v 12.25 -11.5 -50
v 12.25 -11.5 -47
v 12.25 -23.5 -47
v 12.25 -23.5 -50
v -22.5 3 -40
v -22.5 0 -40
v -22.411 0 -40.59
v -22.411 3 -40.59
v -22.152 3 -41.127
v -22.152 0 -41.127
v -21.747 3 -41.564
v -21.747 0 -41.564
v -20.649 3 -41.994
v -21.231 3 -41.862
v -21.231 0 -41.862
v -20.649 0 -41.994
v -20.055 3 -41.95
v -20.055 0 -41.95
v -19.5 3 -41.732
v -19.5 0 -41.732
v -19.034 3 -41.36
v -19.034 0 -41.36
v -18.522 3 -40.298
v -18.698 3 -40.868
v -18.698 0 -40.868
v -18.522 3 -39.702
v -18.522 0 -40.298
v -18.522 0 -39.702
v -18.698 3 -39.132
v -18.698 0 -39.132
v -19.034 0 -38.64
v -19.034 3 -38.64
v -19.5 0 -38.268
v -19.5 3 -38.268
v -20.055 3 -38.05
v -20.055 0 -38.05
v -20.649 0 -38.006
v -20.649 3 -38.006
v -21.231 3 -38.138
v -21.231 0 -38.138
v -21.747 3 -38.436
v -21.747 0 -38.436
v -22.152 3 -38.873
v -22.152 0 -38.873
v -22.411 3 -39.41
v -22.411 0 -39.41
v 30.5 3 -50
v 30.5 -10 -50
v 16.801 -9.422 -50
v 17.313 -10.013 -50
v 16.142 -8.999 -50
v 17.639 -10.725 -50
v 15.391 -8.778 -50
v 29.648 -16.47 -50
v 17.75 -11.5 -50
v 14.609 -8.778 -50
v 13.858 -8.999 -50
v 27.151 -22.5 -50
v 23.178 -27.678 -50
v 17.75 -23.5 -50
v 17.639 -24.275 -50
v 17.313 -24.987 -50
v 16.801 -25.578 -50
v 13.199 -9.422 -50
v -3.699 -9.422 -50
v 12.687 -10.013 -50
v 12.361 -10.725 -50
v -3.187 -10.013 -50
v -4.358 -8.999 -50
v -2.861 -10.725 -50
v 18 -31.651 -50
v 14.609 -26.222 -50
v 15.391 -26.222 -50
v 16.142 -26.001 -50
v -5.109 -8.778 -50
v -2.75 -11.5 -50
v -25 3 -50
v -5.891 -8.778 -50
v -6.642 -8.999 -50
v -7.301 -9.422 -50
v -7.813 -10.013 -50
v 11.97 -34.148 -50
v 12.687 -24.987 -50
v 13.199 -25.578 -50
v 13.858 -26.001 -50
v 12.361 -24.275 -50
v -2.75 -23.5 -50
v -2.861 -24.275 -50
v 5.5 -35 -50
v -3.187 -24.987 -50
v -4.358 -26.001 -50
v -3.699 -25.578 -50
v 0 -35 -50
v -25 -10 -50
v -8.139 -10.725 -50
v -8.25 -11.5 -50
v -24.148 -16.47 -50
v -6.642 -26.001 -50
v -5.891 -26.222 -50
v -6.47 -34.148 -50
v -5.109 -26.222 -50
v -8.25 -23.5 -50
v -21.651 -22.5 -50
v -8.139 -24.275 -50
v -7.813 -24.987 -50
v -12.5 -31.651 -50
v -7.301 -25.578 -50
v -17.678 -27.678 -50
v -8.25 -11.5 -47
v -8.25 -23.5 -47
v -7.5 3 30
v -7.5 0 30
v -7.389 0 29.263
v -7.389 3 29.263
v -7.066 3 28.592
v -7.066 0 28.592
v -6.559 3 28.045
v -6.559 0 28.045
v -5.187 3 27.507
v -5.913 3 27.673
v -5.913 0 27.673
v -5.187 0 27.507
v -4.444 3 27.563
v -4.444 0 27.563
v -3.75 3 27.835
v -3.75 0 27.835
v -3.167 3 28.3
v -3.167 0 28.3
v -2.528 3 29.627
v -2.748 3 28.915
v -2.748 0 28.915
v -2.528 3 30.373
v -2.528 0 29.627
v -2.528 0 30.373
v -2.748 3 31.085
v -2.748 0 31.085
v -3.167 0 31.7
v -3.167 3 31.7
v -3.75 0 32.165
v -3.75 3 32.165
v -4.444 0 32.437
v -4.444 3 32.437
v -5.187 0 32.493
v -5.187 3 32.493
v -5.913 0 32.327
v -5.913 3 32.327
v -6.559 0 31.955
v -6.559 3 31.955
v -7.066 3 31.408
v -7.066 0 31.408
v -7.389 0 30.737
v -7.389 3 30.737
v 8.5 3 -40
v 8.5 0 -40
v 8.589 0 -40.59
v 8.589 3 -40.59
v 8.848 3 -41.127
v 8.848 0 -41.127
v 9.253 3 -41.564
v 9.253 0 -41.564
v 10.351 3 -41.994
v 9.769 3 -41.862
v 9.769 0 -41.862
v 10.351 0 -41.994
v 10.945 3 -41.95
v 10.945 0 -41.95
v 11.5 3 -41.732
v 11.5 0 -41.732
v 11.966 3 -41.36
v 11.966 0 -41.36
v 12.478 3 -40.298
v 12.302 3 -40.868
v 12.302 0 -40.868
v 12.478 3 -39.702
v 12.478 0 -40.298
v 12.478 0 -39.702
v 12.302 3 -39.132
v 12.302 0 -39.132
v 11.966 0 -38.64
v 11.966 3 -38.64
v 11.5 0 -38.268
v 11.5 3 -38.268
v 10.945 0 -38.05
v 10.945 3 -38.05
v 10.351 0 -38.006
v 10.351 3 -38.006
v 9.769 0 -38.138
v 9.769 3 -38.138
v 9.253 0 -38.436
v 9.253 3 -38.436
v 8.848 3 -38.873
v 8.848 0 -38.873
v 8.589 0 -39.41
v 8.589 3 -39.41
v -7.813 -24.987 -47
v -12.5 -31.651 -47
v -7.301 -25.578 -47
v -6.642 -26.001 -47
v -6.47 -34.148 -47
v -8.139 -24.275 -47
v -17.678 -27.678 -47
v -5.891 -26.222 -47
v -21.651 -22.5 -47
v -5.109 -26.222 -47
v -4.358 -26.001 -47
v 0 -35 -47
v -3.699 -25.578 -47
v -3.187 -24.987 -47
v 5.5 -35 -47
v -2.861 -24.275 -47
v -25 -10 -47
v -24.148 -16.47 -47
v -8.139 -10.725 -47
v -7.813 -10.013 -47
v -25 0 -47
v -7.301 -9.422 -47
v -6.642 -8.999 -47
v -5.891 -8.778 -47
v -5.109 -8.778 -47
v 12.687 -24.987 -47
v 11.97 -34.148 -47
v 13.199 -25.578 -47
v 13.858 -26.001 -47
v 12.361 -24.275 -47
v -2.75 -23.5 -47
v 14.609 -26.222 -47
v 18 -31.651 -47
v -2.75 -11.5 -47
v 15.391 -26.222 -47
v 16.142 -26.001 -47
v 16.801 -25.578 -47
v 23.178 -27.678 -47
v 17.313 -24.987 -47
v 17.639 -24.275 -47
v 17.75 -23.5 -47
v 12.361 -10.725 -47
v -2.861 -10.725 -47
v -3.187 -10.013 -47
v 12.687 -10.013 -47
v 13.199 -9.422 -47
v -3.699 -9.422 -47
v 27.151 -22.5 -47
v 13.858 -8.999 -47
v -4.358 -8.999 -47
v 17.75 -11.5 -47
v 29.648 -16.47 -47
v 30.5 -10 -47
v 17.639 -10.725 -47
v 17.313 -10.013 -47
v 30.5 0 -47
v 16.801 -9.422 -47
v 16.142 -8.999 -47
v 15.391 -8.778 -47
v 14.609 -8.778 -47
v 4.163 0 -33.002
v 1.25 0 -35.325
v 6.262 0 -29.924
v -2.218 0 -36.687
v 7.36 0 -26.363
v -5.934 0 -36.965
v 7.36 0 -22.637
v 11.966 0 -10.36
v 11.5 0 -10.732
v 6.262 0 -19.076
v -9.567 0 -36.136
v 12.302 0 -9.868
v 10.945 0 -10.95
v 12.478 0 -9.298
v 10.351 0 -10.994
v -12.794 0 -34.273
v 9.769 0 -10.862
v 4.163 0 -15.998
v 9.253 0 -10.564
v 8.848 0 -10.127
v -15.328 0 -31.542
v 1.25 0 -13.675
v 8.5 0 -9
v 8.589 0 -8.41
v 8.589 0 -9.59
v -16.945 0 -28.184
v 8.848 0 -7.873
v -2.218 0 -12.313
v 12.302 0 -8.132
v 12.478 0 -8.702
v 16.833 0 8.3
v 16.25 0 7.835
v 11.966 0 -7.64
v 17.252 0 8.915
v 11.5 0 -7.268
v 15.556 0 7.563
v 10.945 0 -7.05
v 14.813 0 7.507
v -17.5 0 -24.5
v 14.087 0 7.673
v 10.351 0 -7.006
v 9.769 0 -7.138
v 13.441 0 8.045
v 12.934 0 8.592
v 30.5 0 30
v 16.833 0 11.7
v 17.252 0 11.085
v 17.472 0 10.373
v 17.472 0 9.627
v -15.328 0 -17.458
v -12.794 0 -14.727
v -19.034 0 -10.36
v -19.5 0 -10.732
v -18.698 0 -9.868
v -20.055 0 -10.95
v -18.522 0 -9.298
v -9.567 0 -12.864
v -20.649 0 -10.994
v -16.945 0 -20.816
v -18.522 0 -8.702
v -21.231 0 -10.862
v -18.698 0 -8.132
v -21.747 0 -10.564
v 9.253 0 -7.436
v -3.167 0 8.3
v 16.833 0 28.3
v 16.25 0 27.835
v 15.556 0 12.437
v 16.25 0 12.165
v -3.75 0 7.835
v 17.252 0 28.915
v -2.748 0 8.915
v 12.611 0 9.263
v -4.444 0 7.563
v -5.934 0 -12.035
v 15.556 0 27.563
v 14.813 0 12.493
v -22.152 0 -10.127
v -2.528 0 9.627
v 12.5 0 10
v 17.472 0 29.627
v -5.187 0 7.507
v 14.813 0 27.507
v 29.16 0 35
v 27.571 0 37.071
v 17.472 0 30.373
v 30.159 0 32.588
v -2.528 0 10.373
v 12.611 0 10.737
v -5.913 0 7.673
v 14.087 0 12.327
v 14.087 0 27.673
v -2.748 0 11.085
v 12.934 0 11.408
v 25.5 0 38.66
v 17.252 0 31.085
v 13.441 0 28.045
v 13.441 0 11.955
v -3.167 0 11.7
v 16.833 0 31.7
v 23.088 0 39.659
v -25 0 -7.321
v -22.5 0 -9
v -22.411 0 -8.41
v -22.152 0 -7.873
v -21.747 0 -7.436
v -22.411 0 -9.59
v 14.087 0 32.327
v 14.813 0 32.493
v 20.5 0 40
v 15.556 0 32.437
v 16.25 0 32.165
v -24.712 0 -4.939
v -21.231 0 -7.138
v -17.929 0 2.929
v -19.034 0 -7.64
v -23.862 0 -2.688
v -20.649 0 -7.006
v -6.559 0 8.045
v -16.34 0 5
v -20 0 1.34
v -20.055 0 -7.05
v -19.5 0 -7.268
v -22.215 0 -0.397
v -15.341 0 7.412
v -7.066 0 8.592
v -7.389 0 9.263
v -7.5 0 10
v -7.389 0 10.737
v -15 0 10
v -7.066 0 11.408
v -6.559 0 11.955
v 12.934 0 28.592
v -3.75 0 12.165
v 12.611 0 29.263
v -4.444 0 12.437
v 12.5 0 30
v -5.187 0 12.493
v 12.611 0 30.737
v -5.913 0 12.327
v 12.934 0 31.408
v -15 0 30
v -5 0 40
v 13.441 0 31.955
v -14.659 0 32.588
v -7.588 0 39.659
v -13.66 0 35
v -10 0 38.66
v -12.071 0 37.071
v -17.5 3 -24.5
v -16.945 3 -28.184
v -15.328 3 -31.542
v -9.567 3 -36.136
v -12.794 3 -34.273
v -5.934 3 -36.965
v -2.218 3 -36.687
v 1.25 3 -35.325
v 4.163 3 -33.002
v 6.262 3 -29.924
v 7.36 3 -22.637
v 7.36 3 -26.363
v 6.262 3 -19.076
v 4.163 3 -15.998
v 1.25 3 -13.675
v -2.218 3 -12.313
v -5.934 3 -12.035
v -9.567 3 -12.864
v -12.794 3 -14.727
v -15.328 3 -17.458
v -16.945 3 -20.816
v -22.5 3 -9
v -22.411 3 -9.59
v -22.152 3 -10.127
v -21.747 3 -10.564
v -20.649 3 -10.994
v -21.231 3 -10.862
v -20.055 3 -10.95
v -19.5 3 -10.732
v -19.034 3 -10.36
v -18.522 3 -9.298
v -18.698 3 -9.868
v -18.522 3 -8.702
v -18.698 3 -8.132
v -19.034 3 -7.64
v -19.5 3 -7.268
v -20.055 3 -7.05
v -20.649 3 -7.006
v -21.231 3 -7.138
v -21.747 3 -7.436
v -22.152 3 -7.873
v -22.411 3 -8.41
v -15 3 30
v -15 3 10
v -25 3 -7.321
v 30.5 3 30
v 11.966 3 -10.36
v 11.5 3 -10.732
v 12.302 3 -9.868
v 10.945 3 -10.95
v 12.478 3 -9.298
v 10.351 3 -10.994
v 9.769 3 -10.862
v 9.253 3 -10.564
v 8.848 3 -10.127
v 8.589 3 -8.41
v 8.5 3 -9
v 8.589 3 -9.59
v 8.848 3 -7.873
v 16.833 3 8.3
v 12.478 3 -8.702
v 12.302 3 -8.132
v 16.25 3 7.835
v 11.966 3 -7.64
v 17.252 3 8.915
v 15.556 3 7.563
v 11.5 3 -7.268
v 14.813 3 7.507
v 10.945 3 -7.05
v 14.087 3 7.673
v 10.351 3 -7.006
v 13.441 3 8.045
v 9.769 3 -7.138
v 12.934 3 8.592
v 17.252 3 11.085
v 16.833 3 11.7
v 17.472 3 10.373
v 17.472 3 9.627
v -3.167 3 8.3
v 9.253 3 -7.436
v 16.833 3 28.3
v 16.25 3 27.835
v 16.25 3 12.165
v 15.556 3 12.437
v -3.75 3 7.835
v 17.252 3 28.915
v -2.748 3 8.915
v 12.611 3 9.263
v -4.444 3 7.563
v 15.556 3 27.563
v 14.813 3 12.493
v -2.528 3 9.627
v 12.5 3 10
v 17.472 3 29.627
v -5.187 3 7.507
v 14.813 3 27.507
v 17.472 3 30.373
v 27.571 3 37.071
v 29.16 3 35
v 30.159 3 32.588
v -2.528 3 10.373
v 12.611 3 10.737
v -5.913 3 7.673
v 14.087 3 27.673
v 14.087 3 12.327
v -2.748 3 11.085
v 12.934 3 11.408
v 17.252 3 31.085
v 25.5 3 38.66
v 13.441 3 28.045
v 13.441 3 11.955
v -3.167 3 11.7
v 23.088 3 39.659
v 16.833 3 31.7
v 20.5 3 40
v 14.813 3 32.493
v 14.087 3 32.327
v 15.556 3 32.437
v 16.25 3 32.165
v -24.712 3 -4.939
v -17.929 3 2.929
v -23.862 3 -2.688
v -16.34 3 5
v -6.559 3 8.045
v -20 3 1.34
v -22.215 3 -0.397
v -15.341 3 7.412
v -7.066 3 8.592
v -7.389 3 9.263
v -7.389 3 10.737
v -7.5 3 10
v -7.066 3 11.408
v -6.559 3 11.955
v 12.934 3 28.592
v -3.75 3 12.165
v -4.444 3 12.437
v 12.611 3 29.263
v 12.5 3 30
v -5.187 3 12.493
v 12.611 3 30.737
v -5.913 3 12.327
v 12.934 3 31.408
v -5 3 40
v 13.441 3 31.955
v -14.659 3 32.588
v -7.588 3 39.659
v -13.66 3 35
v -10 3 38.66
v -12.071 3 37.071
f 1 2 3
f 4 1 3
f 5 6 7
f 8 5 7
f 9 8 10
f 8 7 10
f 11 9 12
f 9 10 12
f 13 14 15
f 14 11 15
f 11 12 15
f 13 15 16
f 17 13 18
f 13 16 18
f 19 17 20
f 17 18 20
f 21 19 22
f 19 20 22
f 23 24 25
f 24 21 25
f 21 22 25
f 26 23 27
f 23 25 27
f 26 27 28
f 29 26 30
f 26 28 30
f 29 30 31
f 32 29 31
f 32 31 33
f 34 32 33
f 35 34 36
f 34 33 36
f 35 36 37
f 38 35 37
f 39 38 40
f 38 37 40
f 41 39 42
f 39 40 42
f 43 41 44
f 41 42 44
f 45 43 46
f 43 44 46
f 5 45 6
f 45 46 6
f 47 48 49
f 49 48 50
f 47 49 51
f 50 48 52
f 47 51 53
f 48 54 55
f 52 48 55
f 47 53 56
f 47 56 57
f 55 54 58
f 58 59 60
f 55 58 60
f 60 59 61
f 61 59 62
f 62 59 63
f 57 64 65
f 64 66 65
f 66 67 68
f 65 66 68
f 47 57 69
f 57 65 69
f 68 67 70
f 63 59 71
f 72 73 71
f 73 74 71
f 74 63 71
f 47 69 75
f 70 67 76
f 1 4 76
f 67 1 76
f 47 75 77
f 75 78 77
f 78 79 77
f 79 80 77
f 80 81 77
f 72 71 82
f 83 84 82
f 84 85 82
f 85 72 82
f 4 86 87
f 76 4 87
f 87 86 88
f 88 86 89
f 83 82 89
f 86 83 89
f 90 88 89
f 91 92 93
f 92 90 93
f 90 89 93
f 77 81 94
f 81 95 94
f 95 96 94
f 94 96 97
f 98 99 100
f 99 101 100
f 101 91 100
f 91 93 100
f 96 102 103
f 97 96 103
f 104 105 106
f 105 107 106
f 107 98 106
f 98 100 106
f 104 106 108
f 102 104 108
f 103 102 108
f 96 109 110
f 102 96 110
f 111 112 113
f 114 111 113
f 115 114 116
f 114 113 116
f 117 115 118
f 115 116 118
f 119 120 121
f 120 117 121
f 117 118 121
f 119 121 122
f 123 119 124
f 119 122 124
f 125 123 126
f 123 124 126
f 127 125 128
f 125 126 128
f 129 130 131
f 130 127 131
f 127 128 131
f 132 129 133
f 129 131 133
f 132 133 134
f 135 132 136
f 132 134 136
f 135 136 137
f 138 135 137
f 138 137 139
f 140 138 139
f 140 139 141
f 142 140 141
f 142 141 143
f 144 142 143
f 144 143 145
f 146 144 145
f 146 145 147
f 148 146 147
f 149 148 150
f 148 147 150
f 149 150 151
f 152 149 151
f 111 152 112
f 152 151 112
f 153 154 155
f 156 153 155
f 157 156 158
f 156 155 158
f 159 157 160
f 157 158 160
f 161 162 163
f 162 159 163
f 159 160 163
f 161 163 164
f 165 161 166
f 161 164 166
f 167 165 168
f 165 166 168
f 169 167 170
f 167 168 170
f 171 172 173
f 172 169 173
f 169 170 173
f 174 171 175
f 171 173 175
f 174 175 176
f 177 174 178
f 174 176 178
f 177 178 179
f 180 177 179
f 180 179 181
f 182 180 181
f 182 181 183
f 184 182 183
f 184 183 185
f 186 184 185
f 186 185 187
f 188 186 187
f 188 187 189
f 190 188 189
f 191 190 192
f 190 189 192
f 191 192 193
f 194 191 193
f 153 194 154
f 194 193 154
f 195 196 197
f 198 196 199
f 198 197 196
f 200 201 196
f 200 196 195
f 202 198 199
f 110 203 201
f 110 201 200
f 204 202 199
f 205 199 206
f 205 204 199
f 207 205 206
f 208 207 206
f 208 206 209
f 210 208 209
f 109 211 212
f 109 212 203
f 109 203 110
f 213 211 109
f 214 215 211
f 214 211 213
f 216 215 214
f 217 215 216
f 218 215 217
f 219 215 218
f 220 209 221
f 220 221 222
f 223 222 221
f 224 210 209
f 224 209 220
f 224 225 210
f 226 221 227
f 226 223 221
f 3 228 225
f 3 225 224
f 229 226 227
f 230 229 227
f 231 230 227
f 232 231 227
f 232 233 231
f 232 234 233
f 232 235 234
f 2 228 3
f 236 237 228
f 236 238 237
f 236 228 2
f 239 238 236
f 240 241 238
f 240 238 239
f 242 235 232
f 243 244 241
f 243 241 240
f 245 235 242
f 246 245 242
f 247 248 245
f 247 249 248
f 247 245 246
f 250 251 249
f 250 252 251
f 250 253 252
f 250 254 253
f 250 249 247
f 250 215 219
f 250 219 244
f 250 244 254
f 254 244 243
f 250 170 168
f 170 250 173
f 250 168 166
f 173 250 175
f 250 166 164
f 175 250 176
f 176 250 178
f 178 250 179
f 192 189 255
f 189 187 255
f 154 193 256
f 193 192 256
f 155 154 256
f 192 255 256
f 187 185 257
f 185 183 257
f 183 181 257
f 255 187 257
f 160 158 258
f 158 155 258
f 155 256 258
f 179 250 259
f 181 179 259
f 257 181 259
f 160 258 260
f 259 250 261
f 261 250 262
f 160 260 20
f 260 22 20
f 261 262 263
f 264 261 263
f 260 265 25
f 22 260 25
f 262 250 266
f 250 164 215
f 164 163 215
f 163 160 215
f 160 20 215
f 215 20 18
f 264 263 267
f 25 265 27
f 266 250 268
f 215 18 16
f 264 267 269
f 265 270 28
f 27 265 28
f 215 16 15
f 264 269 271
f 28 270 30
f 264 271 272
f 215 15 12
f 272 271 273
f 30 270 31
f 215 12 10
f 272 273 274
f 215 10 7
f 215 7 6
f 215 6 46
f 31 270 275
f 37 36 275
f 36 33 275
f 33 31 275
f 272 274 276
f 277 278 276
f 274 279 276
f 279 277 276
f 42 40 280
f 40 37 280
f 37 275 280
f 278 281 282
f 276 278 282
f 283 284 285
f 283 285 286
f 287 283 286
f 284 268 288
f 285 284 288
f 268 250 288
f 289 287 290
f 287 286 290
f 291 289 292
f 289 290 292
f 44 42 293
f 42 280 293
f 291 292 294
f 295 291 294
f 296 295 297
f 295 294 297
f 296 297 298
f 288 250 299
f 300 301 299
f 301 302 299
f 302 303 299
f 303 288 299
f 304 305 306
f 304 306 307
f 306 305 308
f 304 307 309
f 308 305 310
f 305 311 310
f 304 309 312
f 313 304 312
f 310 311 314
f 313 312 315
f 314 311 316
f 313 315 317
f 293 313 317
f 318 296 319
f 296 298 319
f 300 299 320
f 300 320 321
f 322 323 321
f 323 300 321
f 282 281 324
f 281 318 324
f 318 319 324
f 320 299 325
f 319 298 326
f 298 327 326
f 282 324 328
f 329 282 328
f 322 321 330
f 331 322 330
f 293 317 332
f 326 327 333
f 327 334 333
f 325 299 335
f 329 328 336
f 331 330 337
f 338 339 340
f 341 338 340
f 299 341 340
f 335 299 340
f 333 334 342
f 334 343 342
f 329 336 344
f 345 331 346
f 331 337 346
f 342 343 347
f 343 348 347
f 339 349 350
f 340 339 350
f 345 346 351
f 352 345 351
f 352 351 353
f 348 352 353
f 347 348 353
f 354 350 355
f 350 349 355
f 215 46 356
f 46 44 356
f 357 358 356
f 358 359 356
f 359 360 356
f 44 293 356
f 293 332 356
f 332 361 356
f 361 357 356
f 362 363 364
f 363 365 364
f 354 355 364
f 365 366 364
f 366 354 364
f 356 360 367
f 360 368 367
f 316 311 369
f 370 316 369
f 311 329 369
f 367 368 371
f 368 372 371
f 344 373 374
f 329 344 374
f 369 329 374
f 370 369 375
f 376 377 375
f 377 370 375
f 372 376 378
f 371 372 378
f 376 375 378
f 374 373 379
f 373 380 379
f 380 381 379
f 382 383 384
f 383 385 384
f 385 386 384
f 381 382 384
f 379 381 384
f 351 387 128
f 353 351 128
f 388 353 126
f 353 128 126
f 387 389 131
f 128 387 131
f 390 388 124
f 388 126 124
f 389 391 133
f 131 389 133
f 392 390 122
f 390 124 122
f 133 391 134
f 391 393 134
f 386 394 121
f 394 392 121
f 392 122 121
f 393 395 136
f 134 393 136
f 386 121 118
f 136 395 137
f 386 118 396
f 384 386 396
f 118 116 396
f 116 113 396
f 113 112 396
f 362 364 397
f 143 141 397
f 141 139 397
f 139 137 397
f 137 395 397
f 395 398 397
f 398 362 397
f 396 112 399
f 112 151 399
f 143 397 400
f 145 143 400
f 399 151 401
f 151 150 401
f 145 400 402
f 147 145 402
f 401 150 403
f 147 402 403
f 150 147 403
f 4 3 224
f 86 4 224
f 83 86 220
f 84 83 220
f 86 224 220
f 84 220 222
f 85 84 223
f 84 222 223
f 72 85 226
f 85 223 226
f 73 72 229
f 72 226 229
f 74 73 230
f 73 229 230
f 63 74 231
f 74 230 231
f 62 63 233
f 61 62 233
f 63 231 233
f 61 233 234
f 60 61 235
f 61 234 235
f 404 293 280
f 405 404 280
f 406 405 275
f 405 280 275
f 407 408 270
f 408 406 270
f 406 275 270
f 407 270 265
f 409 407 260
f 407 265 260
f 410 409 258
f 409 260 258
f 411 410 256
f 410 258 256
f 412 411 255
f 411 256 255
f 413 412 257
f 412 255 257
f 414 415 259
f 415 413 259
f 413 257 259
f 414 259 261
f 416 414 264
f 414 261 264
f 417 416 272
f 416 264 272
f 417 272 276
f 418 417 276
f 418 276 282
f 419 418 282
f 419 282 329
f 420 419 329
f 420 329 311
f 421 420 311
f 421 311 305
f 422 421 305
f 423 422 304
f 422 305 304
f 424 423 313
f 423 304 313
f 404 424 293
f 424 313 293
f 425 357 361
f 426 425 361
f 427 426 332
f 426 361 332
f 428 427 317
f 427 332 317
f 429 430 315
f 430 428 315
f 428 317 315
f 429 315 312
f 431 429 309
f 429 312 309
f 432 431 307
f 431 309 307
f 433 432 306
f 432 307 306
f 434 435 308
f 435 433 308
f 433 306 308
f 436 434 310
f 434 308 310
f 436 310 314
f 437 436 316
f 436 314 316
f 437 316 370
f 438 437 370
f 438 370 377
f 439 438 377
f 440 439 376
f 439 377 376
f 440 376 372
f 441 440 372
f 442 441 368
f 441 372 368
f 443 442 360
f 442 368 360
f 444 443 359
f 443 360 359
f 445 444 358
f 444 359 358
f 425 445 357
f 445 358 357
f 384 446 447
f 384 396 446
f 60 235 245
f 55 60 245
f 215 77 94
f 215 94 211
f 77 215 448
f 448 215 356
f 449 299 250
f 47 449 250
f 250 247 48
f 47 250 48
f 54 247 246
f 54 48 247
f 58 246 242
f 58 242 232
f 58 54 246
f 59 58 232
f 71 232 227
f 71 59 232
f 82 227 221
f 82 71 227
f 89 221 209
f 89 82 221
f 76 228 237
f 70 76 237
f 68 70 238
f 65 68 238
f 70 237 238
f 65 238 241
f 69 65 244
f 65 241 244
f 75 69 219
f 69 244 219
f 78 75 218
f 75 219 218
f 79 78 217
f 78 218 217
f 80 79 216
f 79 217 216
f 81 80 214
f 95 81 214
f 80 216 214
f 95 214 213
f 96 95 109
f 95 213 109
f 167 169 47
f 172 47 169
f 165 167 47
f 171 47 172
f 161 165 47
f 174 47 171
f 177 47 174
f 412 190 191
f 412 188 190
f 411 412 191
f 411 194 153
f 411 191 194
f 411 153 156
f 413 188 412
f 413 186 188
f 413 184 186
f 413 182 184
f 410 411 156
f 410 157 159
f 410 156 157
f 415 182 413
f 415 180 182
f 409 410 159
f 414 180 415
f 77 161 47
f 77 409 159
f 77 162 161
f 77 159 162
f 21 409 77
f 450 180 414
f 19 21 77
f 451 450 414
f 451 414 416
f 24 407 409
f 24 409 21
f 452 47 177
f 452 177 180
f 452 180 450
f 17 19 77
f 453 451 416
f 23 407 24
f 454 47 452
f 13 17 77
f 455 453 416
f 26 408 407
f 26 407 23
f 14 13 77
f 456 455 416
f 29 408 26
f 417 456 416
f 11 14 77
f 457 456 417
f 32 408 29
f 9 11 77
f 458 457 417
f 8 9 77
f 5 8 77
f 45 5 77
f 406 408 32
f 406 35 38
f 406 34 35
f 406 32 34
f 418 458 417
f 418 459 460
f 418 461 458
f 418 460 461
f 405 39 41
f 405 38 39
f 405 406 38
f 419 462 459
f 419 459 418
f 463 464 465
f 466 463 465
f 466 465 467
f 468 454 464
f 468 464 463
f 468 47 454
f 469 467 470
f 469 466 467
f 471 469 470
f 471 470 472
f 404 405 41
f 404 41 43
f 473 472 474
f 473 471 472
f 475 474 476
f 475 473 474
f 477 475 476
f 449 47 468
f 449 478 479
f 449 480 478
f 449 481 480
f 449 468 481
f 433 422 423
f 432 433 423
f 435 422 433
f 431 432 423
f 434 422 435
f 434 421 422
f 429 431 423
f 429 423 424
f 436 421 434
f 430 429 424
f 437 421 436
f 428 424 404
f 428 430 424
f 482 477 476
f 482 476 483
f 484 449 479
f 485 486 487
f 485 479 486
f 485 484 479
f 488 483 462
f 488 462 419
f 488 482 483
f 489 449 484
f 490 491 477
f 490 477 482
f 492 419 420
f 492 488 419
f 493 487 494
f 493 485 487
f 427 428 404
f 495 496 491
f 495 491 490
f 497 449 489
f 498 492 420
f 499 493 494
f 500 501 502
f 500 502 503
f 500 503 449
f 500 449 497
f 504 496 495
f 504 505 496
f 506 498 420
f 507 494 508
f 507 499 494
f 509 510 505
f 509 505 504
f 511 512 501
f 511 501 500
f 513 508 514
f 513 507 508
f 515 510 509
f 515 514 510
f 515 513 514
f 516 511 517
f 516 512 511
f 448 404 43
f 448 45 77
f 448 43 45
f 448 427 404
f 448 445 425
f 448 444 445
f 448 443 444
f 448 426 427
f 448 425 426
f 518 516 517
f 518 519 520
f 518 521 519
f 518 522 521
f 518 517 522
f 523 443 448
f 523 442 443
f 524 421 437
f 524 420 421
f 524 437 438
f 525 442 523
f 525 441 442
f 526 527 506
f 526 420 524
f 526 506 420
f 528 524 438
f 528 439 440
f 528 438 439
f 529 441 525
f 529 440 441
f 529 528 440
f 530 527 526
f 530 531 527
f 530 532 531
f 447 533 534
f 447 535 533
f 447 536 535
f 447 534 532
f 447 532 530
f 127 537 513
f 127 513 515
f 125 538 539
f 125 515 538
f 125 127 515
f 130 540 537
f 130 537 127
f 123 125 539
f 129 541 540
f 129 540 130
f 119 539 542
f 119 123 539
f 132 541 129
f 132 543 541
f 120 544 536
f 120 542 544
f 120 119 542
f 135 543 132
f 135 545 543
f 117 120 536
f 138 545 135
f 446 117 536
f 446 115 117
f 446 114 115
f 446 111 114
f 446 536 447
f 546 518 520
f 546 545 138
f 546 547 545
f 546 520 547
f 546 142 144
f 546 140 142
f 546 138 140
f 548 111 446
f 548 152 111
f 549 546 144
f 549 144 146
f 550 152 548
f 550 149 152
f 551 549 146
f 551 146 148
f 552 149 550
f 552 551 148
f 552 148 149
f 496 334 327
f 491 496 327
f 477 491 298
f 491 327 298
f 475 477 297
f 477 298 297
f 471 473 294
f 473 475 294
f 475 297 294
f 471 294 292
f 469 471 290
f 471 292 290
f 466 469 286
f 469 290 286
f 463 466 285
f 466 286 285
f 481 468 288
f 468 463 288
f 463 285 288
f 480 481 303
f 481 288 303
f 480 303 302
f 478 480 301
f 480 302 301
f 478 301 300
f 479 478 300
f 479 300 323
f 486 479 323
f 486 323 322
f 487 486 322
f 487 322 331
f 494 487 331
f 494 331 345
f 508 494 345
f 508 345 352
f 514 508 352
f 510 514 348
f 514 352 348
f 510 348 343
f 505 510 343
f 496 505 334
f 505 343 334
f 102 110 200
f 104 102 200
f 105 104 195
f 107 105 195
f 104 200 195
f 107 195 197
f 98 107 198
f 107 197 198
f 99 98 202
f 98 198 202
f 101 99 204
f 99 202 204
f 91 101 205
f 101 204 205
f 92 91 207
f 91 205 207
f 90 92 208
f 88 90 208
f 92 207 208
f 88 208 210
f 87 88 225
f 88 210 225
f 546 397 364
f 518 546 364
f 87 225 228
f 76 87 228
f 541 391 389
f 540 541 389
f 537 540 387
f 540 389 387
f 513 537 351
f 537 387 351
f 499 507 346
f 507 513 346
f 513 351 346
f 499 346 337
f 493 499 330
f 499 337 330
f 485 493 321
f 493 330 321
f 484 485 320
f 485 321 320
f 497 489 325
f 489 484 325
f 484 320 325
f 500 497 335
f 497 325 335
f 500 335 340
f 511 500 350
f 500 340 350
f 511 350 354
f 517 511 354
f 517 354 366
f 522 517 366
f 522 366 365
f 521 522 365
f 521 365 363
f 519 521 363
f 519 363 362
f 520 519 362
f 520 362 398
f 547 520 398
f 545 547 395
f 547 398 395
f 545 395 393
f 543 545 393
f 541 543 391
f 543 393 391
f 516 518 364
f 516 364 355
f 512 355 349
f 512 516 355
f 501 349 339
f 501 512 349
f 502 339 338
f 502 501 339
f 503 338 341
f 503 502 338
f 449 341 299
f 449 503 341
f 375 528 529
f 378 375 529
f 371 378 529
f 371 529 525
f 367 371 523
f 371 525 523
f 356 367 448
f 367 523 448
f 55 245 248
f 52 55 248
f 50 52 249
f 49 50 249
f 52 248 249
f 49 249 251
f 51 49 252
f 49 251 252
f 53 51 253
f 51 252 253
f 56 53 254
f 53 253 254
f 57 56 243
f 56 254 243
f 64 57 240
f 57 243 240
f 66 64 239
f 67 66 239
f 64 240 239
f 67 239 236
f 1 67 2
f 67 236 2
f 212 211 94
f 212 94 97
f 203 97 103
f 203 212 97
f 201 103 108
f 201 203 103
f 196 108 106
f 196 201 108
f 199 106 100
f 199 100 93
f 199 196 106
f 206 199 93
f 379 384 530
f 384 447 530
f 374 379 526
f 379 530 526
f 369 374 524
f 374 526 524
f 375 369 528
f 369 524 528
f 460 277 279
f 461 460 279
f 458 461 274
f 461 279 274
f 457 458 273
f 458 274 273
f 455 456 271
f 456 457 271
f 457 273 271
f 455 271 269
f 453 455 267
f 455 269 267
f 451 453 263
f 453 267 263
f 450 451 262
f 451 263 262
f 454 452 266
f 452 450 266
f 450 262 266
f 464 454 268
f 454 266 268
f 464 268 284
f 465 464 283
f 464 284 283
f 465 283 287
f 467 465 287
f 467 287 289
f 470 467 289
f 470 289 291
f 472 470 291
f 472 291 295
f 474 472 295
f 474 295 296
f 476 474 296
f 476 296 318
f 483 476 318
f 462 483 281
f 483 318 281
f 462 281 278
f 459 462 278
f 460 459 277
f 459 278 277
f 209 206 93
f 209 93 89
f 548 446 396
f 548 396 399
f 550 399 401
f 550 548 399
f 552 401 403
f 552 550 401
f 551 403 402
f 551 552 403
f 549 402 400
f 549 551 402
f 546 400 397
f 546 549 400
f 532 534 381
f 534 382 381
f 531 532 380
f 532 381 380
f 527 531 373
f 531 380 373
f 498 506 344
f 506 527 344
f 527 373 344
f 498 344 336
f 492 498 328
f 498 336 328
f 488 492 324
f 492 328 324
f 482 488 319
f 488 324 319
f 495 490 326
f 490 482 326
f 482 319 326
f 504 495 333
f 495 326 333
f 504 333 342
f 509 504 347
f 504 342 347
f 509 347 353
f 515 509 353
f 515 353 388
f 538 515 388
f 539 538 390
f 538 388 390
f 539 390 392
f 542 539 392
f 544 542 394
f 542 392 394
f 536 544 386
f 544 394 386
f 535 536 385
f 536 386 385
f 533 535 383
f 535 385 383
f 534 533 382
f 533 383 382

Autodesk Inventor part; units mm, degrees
ref_plane "YZ Plane" through (0, 0, 0) normal (1, 0, 0) x (0, 1, 0)
ref_plane "XZ Plane" through (0, 0, 0) normal (0, 1, 0) x (-1, 0, 0)
ref_plane "XY Plane" through (0, 0, 0) normal (0, 0, 1) x (1, 0, 0)
sketch "Sketch1" plane through (0, 0, 0) normal (0, 1, 0) x (-1, 0, 0)
  line L0 (25, 40) -> (-30.5, 40)
  line L1 (-30.5, 40) -> (-30.5, -50)
  line L2 (-30.5, -50) -> (25, -50)
  line L3 (25, -50) -> (25, 40)
  line L4 (25, 40) -> (15, 40)
  line L5 (15, 40) -> (15, 0)
  line L6 (25, -50) -> (25, -40) construction
  line L7 (25, -40) -> (20.5, -40) construction
  line L8 (20.5, -40) -> (20.5, -9) construction
  line L9 (20.5, -9) -> (-10.5, -9) construction
  line L10 (-10.5, -9) -> (-10.5, -40) construction
  line L11 (-10.5, -40) -> (20.5, -40) construction
  circle A0 centre (5, -24.5) radius 12.5
  circle A1 centre (20.5, -9) radius 2
  circle A2 centre (20.5, -40) radius 2
  circle A3 centre (-10.5, -9) radius 2
  circle A4 centre (-10.5, -40) radius 2
  line L12 (15, 40) -> (5, 40) construction
  line L13 (5, 40) -> (5, 30) construction
  line L14 (5, 30) -> (15, 30) construction
  line L15 (15, 30) -> (15, 40) construction
  line L16 (5, 30) -> (-15, 30) construction
  line L17 (-15, 30) -> (-15, 10) construction
  line L18 (-15, 10) -> (5, 10) construction
  line L19 (5, 10) -> (5, 30) construction
  circle A5 centre (5, 30) radius 2.5
  circle A6 centre (5, 10) radius 2.5
  circle A7 centre (-15, 30) radius 2.5
  circle A8 centre (-15, 10) radius 2.5
  line L20 (15, 0) -> (25, 0)
  point P0 (25, -5)
  dimension "d0" = 55.5
  dimension "d1" = 90
  dimension "d2" = 10
  dimension "d3" = 40
  dimension "d4" = 10
  dimension "d5" = 4.5
  dimension "d6" = 31
  dimension "d7" = 31
  dimension "d8" = 31
  dimension "d9" = 25
  dimension "d10" = 4
  dimension "d11" = 4
  dimension "d12" = 4
  dimension "d13" = 4
  dimension "d14" = 10
  dimension "d15" = 10
  dimension "d16" = 20
  dimension "d17" = 20
  dimension "d18" = 5
  dimension "d19" = 5
  dimension "d20" = 5
  dimension "d21" = 5
  dimension "d25" = 15.5
extrude "Extrusion1" add sketch "Sketch1" along normal blind 3 contours L5 L20 L3 L2 L1 L0
sketch "Sketch2" plane through (0, 0, 0) normal (0, -1, 0) x (1, 0, 0)
  line L0 (30.5, 40) -> (30.5, -50) projected
  line L1 (-25, -50) -> (-25, 0) projected
  line L2 (30.5, -50) -> (-25, -50)
  line L3 (-25, -50) -> (-25, -47)
  line L4 (-25, -47) -> (30.5, -47)
  line L5 (30.5, -47) -> (30.5, -50)
  point P0 (0, 0)
  dimension "d26" = 3
extrude "Extrusion2" add sketch "Sketch2" along normal blind 35
sketch "Sketch3" plane through (-25, 0, -47) normal (0, 0, 1) x (1, 0, 0)
  line L0 (55.5, -35) -> (55.5, 3) construction
  line L1 (0, 0) -> (0, -35) projected
  line L2 (10, 3) -> (55.5, 3) construction
  line L3 (55.5, 3) -> (55.5, -17.5) construction
  line L4 (55.5, -17.5) -> (0, -17.5) construction
  line L5 (0, 3) -> (0, -35) construction
  line L6 (55.5, -17.5) -> (40, -17.5) construction
  line L7 (40, -17.5) -> (19.5, -17.5) construction
  line L8 (19.5, -23.5) -> (19.5, -11.5) construction
  line L9 (22.25, -23.5) -> (22.25, -11.5)
  line L10 (16.75, -11.5) -> (16.75, -23.5)
  arc A0 (16.75, -23.5) -> (22.25, -23.5) centre (19.5, -23.5) ccw
  arc A1 (22.25, -11.5) -> (16.75, -11.5) centre (19.5, -11.5) ccw
  line L11 (40, -23.5) -> (40, -11.5) construction
  line L12 (42.75, -23.5) -> (42.75, -11.5)
  line L13 (37.25, -11.5) -> (37.25, -23.5)
  arc A2 (37.25, -23.5) -> (42.75, -23.5) centre (40, -23.5) ccw
  arc A3 (42.75, -11.5) -> (37.25, -11.5) centre (40, -11.5) ccw
  line L14 (10, 0) -> (55.5, 0) projected
  point P0 (25, 0)
  dimension "d38" = 15.5
  dimension "d39" = 20.5
  dimension "d40" = 6
  dimension "d41" = 5.5
  dimension "d42" = 6
  dimension "d43" = 5.5
  dimension "d47" = 17.5
extrude "Extrusion3" cut sketch "Sketch3" against normal through all
fillet "Fillet3" radius 10 4 edges at (-25, 1.5, 0) (-15, 1.5, 40) (30.5, 1.5, 40) (-15, 1.5, 0)
fillet "Fillet4" radius 25 2 edges at (-25, -35, -48.5) (30.5, -35, -48.5)
properties part number "ActuatorPulleyPlate" material "Aluminum 6061"
